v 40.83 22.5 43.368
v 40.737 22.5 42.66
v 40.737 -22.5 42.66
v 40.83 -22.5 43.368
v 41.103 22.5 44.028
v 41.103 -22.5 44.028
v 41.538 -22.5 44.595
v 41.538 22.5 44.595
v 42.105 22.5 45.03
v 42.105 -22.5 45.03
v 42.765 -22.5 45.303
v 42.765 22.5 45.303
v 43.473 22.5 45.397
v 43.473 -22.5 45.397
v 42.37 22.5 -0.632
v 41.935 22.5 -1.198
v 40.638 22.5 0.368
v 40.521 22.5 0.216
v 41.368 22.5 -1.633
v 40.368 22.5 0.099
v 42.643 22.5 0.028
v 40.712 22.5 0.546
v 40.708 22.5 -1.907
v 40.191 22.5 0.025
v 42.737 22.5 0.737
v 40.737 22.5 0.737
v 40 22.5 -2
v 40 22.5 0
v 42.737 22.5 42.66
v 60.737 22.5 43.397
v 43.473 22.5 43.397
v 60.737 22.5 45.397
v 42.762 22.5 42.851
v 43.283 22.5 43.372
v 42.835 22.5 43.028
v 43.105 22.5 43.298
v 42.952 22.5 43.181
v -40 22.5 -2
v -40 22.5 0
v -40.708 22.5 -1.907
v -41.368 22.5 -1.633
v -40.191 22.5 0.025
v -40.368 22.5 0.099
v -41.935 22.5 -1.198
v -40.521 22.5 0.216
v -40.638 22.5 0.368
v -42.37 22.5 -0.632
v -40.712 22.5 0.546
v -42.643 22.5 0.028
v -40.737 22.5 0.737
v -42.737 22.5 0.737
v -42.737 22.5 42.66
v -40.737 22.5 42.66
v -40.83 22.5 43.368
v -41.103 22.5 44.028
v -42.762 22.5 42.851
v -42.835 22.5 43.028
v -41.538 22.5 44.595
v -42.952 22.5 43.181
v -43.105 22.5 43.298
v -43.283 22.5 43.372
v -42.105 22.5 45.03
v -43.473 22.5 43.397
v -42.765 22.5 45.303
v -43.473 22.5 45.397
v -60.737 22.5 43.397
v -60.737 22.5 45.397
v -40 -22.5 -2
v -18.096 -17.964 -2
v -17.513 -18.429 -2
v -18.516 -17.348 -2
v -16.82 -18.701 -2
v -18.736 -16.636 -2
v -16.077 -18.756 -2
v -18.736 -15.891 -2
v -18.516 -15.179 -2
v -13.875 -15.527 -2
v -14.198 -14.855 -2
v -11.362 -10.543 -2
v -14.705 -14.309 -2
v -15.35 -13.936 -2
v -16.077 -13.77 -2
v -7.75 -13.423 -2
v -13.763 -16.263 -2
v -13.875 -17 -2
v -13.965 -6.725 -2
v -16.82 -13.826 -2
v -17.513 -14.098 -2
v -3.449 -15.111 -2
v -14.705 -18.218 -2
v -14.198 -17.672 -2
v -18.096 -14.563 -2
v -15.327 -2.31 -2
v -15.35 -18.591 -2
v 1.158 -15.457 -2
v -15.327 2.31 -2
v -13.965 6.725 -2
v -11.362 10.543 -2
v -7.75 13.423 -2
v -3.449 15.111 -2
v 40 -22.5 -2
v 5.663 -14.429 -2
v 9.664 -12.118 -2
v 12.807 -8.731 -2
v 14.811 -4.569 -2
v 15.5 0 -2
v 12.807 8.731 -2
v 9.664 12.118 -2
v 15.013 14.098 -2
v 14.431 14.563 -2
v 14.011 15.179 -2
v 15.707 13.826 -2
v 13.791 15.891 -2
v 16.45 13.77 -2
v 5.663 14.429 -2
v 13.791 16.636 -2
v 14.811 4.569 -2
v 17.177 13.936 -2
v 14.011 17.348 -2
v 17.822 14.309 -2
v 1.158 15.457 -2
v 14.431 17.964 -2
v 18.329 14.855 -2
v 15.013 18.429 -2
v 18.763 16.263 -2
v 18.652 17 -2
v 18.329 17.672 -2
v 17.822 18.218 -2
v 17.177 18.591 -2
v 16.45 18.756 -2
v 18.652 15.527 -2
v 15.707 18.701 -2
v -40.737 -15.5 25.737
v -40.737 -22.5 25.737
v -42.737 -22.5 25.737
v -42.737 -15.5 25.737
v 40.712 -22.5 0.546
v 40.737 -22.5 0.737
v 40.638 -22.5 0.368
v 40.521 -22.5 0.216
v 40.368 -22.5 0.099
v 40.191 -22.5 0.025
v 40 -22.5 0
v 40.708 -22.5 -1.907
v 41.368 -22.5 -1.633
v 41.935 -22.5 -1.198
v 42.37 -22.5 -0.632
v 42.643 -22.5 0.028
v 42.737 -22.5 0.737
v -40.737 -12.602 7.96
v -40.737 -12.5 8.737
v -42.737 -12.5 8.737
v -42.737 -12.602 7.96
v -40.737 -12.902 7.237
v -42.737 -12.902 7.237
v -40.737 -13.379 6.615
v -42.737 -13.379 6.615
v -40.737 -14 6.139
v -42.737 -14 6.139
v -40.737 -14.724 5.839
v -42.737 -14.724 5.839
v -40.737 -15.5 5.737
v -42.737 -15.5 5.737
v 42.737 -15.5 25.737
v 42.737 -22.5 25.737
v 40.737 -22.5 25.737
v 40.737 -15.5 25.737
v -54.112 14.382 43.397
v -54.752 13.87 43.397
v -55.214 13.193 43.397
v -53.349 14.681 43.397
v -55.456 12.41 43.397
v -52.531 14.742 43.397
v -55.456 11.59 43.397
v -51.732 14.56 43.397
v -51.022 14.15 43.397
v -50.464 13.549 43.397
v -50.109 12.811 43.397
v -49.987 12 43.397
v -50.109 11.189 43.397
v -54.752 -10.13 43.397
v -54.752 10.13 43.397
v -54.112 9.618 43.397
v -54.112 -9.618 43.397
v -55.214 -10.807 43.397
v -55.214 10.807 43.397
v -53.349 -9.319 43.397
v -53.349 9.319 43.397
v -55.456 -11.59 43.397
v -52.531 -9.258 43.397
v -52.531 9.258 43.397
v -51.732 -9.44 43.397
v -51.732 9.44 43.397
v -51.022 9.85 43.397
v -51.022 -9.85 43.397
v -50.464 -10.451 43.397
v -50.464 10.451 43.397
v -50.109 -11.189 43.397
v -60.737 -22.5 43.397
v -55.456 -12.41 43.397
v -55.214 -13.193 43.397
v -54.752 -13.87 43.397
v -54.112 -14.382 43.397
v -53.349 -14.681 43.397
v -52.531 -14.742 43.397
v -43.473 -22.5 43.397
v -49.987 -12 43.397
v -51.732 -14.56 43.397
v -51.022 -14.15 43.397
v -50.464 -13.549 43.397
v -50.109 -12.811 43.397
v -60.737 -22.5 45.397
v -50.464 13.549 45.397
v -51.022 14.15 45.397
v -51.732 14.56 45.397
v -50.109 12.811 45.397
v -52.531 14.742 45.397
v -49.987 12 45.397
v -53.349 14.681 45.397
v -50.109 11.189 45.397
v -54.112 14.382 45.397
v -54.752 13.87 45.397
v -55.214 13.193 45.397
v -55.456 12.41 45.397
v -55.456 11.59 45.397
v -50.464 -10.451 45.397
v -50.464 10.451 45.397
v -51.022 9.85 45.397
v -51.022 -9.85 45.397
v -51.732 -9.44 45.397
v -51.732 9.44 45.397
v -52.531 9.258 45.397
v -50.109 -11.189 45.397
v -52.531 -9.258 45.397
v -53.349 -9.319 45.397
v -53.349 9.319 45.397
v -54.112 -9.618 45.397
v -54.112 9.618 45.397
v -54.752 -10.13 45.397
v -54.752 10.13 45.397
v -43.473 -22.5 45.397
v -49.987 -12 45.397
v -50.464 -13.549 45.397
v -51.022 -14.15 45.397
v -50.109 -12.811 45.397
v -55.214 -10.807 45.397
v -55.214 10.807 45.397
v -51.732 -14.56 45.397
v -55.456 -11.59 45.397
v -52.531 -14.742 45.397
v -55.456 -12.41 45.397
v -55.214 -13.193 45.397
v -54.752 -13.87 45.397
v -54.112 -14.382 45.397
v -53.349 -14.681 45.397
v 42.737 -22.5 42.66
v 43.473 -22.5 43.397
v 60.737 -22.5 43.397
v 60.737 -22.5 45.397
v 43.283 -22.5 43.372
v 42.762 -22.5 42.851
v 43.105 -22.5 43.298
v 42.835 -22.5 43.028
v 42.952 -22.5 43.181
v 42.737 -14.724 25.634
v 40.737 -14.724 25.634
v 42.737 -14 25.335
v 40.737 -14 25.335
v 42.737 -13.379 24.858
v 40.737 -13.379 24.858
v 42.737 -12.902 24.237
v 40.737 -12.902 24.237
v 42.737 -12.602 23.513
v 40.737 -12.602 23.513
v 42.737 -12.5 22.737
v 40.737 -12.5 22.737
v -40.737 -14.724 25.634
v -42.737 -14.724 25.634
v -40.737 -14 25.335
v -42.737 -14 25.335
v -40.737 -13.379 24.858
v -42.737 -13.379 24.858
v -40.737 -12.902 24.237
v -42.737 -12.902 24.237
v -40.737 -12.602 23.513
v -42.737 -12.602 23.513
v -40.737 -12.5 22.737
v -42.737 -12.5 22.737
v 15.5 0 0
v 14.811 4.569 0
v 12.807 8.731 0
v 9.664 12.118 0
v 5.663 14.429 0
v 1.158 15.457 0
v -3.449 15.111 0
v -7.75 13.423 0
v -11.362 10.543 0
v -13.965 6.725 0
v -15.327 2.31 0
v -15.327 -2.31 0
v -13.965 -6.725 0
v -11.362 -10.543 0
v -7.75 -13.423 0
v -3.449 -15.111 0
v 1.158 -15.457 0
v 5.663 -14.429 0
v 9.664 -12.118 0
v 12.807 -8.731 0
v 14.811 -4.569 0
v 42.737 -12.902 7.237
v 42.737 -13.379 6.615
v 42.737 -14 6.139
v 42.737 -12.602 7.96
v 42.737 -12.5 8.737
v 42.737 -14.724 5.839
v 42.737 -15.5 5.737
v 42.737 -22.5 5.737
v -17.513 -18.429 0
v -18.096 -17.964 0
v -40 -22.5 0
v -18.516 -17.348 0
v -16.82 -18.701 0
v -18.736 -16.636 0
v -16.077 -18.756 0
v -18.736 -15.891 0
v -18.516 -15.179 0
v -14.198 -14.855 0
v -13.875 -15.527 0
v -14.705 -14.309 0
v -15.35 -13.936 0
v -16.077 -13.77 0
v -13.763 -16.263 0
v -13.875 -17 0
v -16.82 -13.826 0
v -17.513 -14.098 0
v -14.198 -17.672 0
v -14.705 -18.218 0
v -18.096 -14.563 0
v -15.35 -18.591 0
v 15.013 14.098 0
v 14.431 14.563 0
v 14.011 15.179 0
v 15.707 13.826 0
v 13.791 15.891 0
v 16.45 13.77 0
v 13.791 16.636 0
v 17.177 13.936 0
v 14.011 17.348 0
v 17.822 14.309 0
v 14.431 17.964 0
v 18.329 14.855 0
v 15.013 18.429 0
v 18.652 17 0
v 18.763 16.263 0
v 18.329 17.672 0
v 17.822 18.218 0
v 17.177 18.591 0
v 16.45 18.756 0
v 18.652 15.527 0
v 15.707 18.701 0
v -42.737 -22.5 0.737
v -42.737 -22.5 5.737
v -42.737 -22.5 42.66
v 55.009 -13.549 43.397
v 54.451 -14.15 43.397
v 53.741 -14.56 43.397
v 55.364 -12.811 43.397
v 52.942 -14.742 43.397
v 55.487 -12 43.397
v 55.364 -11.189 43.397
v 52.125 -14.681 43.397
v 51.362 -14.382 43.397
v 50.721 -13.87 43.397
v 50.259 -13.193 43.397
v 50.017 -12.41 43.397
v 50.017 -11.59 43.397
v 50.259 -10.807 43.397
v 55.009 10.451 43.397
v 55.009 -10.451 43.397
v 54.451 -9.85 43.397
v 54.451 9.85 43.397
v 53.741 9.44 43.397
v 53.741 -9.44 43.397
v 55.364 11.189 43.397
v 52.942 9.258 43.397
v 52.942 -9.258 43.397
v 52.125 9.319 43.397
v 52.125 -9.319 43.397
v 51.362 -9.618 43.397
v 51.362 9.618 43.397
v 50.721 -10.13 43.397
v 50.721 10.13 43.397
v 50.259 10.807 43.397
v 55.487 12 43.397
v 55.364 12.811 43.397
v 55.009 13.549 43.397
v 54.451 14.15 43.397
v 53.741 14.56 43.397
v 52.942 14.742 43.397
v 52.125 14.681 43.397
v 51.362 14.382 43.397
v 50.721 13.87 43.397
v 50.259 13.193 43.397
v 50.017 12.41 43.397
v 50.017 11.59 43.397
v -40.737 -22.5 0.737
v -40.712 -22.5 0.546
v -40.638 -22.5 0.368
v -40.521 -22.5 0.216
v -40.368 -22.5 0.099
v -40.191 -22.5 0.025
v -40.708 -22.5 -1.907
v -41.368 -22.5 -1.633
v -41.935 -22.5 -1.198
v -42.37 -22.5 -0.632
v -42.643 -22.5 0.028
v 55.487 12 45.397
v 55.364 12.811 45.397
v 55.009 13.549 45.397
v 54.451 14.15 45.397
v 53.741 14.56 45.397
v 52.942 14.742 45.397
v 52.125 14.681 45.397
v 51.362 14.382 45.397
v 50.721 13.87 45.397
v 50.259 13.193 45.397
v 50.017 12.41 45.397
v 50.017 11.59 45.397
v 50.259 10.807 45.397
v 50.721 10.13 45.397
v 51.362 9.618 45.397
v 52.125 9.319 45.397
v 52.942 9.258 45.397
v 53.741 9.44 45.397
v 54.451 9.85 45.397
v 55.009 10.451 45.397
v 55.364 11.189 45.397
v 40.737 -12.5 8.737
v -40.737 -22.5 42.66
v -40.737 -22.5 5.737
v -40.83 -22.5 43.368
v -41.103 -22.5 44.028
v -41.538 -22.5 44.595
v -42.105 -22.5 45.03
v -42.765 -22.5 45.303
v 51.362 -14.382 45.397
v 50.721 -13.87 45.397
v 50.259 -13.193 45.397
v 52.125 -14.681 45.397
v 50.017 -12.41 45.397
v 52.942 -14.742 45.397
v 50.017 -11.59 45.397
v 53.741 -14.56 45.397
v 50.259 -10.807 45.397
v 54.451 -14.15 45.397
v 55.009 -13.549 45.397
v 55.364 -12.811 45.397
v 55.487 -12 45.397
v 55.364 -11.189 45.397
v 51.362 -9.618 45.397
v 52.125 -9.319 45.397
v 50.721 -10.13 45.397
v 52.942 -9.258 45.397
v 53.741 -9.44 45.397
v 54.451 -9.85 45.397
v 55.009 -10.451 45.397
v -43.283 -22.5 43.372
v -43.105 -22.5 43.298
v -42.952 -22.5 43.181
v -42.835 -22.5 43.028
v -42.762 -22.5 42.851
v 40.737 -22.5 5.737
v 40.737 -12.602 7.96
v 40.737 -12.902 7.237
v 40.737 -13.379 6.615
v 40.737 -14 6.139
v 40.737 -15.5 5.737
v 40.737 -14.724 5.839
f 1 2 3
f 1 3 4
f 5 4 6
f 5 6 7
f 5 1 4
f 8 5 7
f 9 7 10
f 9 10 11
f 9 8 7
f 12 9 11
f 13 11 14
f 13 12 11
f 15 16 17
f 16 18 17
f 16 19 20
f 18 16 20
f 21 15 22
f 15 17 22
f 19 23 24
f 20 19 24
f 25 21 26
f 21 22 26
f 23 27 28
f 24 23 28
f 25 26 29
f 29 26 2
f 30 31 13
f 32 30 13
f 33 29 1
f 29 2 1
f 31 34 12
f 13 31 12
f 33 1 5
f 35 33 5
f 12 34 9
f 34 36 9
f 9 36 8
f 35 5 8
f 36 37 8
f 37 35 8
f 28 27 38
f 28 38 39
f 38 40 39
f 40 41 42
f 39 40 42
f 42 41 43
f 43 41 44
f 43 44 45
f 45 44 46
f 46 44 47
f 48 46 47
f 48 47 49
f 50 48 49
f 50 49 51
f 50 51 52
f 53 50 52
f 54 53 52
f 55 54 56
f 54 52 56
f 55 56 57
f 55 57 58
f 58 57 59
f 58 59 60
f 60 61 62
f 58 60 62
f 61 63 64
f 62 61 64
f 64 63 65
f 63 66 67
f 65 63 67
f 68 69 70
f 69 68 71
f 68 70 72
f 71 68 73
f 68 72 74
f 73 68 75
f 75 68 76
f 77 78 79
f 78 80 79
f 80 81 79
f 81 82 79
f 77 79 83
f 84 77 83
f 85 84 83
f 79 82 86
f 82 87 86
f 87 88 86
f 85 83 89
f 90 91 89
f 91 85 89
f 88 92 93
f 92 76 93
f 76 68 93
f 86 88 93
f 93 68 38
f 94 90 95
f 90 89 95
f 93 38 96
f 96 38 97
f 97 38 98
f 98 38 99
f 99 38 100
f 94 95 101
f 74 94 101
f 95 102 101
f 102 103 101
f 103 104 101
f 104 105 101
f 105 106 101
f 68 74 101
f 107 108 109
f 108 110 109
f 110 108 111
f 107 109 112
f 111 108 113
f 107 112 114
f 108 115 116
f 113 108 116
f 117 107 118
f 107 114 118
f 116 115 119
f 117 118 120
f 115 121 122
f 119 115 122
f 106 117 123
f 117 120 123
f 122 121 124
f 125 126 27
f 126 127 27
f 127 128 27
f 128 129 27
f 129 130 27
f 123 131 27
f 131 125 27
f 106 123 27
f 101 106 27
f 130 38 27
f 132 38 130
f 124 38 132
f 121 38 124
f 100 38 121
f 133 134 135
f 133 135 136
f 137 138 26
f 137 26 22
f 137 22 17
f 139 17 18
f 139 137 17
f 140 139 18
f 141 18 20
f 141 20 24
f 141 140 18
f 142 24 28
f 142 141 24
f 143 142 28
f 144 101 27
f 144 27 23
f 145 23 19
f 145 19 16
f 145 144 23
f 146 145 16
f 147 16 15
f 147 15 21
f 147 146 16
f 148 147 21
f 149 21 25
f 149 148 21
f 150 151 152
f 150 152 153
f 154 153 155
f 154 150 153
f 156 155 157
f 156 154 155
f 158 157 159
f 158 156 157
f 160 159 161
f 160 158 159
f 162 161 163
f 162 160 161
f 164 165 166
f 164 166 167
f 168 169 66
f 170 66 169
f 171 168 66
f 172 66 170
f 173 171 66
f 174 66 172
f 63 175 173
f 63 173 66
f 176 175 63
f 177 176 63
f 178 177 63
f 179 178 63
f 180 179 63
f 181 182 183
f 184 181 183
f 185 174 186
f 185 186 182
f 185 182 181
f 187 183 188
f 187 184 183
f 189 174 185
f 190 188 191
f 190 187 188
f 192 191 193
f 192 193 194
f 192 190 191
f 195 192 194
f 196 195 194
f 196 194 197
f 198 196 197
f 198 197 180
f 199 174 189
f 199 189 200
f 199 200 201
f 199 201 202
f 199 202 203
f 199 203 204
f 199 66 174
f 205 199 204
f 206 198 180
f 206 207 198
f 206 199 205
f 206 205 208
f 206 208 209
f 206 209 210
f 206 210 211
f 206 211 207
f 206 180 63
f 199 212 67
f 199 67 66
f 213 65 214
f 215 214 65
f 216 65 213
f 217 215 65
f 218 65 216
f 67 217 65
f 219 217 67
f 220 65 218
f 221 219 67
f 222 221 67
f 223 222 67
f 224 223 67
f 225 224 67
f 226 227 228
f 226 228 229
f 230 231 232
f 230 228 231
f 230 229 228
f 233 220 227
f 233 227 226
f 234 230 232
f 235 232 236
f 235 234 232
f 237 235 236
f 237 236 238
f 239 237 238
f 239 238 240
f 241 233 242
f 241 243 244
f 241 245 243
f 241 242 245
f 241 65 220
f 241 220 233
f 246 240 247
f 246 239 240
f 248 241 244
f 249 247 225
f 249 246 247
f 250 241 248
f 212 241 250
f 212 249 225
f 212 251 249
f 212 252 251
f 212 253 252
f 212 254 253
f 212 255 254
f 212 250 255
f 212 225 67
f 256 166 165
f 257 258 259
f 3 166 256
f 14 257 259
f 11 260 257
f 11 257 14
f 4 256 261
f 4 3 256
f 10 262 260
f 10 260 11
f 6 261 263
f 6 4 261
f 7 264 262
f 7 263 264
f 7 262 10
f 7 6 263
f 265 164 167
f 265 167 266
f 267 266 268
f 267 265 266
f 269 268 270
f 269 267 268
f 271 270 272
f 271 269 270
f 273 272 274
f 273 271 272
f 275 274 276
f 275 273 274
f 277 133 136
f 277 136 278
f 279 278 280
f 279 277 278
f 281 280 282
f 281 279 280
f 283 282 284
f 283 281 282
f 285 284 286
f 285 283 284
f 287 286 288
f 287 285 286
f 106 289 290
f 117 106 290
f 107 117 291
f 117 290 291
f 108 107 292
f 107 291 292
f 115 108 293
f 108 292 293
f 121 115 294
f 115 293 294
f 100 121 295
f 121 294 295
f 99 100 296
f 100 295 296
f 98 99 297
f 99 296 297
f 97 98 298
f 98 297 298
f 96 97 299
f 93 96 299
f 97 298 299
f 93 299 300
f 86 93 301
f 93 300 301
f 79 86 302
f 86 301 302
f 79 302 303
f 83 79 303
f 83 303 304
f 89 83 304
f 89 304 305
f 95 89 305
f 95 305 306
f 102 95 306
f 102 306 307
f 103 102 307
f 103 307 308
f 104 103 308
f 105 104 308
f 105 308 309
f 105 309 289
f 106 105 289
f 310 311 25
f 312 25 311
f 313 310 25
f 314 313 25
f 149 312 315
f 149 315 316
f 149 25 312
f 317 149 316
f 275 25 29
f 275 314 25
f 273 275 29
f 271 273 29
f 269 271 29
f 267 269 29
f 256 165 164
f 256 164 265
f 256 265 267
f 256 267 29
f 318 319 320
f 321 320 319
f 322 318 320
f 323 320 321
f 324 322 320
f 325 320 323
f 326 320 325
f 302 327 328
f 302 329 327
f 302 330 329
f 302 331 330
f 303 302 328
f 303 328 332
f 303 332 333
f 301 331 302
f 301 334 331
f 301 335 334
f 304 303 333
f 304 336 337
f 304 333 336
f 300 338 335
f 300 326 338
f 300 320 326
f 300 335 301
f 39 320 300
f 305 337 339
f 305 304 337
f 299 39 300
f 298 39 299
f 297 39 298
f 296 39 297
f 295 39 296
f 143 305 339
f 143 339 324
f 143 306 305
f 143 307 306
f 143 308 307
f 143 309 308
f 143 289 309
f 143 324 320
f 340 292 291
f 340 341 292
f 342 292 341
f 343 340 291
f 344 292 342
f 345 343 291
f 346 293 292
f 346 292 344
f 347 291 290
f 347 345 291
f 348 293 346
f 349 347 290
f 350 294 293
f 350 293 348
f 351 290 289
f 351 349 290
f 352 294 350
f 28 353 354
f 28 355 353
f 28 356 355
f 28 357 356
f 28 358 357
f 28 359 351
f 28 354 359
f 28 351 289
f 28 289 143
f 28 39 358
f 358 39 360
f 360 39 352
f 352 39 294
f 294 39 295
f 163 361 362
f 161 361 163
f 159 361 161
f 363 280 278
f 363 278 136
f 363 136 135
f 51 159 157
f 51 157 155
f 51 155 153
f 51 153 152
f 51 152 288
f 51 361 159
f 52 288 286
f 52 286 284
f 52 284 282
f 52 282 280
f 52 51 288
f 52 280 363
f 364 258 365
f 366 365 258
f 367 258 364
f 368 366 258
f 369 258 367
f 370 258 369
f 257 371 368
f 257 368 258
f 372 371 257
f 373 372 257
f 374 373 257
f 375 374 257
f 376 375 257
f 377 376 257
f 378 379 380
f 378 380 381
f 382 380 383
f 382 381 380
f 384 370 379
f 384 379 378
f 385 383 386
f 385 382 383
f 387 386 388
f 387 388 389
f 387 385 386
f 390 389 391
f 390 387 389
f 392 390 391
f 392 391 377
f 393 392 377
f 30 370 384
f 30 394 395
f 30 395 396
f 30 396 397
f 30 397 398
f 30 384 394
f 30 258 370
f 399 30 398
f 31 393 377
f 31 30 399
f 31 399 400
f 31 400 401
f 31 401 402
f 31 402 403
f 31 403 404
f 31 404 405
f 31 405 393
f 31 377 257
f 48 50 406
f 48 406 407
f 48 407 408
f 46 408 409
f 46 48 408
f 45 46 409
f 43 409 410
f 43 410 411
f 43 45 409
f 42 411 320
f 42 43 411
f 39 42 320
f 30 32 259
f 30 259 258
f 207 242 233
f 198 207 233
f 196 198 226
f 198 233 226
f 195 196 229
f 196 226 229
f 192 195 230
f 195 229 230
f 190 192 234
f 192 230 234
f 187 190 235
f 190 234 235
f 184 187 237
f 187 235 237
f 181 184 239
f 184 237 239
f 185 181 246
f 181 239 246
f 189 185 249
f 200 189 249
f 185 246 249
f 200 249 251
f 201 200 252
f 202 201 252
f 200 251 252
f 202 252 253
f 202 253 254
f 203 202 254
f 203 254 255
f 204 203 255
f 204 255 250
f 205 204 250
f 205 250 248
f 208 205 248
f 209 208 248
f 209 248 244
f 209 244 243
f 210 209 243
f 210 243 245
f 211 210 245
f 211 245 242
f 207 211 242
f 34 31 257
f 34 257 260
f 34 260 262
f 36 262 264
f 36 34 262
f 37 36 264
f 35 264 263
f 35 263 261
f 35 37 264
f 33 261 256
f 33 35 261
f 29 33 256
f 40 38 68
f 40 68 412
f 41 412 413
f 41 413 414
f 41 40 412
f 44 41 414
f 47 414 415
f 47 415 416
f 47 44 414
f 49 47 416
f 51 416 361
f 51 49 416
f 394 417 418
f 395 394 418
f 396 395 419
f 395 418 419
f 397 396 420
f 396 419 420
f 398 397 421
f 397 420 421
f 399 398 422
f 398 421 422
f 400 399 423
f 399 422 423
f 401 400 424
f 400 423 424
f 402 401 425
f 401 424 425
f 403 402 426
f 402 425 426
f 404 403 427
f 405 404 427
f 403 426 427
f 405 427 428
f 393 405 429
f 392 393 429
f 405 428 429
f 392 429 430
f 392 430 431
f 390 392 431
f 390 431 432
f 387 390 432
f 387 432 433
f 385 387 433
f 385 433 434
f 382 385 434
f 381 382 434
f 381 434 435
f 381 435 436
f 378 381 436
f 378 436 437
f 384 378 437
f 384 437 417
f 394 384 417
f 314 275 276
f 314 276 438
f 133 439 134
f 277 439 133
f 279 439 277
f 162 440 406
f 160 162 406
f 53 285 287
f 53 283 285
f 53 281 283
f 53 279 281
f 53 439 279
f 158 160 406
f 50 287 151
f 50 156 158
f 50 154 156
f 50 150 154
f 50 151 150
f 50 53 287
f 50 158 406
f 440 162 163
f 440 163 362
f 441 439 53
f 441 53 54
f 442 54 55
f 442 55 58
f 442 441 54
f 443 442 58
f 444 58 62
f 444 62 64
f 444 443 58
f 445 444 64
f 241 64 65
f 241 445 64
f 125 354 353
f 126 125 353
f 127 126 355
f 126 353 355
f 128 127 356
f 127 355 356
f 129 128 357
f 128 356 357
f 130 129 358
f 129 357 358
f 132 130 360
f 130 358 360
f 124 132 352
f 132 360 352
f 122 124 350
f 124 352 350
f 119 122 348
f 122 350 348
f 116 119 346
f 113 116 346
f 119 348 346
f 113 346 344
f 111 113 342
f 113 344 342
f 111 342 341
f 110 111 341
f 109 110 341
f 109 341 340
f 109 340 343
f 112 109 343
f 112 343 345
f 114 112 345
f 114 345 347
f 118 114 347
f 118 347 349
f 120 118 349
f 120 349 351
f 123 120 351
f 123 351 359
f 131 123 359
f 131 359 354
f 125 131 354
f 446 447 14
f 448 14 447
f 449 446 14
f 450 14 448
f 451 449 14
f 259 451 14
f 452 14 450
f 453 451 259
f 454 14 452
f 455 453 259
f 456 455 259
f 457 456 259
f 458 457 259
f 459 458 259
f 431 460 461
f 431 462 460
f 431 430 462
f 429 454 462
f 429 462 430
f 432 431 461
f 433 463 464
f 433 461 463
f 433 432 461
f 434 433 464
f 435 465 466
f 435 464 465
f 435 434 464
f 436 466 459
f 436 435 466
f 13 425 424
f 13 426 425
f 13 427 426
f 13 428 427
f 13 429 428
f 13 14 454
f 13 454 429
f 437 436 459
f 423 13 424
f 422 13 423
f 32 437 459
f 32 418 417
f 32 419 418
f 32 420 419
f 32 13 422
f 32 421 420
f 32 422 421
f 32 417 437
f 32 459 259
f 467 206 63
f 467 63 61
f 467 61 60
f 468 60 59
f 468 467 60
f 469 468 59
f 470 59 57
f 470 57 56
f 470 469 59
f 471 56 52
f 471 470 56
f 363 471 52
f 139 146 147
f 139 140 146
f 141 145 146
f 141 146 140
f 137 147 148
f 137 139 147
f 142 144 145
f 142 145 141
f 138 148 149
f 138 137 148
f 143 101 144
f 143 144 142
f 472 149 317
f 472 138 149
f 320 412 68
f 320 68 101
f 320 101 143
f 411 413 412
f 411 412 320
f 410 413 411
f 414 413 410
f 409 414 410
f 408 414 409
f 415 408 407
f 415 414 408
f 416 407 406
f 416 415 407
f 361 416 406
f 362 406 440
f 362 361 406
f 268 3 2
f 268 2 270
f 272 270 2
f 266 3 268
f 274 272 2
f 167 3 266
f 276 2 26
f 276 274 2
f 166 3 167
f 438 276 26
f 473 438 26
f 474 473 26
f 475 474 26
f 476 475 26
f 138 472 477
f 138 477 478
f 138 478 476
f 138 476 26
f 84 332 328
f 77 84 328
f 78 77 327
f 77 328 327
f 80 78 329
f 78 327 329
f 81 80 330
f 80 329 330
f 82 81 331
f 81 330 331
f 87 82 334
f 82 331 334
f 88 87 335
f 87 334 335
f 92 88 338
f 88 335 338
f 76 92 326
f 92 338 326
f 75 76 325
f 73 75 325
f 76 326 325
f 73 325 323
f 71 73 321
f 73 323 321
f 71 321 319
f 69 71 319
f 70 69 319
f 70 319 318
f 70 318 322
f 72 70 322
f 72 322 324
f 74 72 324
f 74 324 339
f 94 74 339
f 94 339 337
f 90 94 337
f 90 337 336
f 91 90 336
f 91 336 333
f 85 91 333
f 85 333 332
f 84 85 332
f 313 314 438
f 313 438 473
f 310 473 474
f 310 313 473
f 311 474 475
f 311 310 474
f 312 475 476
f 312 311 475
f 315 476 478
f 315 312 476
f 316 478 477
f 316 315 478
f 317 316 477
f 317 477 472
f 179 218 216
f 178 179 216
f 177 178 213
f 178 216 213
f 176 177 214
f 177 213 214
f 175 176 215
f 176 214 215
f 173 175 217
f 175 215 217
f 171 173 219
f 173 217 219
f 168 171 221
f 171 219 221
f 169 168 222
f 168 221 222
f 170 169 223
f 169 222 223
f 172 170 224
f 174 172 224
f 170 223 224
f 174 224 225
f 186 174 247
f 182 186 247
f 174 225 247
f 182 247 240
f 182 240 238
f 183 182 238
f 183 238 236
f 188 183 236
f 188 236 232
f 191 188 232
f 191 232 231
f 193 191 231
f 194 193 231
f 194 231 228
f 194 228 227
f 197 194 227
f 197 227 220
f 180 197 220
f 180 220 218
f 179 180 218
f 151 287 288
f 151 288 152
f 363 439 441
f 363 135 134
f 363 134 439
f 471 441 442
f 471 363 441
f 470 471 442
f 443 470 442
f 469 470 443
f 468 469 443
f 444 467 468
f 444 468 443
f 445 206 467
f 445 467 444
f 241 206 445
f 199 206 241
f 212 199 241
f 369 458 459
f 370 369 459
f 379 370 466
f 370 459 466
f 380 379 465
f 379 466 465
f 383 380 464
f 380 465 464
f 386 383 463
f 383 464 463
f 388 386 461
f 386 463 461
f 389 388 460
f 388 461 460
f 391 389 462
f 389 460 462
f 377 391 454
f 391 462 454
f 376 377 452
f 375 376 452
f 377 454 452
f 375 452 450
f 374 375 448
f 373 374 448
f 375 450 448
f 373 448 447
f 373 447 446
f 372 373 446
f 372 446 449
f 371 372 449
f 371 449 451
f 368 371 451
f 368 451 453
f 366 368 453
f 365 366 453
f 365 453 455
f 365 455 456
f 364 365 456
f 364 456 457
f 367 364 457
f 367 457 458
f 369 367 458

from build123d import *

# Parameters (mm, degrees)
SKETCH2_W               = 80
SKETCH2_H               = 45
BASE_FLANGE1_DEPTH      = 2
EDGE_FLANGE1_DEPTH      = 45
EDGE_FLANGE2_DEPTH      = 45
SKETCH13_R              = 15.5
CUT_EXTRUDE1_DEPTH      = 65.440224857
SKETCH14_R              = 2.5
CUT_EXTRUDE2_DEPTH      = 65.440224857
EDGE_FLANGE3_DEPTH      = 45
EDGE_FLANGE3_BEND_DEPTH = 45
SKETCH21_R              = 2.75
CUT_EXTRUDE3_DEPTH      = 81.259717612
CUT_EXTRUDE4_DEPTH      = 116.211997682


# Sheet-metal steps are written as plain solids
with BuildPart() as part:
    # Sketch2 → Base-Flange1 (new body)
    with BuildSketch(Plane.XY):
        Rectangle(SKETCH2_W, SKETCH2_H)
    extrude(amount=-BASE_FLANGE1_DEPTH)

    # Edge-Flange1 section (across the edge) → Edge-Flange1 (add)
    with BuildSketch(Plane(origin=(40.7366, -22.5, 0), x_dir=(-1, 0, 0), z_dir=(0, 1, 0))):
        with BuildLine():
            Line((-2, 0.7366), (-2, 42.66))
            Line((-2, 42.66), (0, 42.66))
            Line((0, 42.66), (0, 0.7366))
            ThreePointArc((0, 0.7366), (0.215745145, 0.215745145), (0.7366, 0))
            Line((0.7366, 0), (0.7366, -2))
            ThreePointArc((0.7366, -2), (-1.198468417, -1.198468417), (-2, 0.7366))
        make_face()
    extrude(amount=EDGE_FLANGE1_DEPTH)

    # Edge-Flange2 section (across the edge) → Edge-Flange2 (add)
    with BuildSketch(Plane(origin=(-40.7366, 22.5, 0), x_dir=(1, 0, 0), z_dir=(0, -1, 0))):
        with BuildLine():
            Line((-2, 0.7366), (-2, 42.66))
            Line((-2, 42.66), (0, 42.66))
            Line((0, 42.66), (0, 0.7366))
            ThreePointArc((0, 0.7366), (0.215745145, 0.215745145), (0.7366, 0))
            Line((0.7366, 0), (0.7366, -2))
            ThreePointArc((0.7366, -2), (-1.198468417, -1.198468417), (-2, 0.7366))
        make_face()
    extrude(amount=EDGE_FLANGE2_DEPTH)

    # Sketch13 → Cut-Extrude1 (cut, through all)
    with BuildSketch(Plane.XY):
        Circle(SKETCH13_R)
    extrude(amount=-CUT_EXTRUDE1_DEPTH, mode=Mode.SUBTRACT)

    # Sketch14 → Cut-Extrude2 (cut, through all)
    with BuildSketch(Plane.XY):
        with Locations((-16.263455967, -16.263455967)):
            Circle(SKETCH14_R)
        with Locations((16.263455967, 16.263455967)):
            Circle(SKETCH14_R)
    extrude(amount=-CUT_EXTRUDE2_DEPTH, mode=Mode.SUBTRACT)

    # Edge-Flange3 section (across the edge) → Edge-Flange3 (add)
    with BuildSketch(Plane(origin=(42.7366, 22.5, 43.3966), x_dir=(0, 0, -1), z_dir=(0, -1, 0))):
        with BuildLine():
            Line((-2, 0.7366), (-2, 18))
            Line((-2, 18), (0, 18))
            Line((0, 18), (0, 0.7366))
            ThreePointArc((0, 0.7366), (0.215745145, 0.215745145), (0.7366, 0))
            Line((0.7366, 0), (0.7366, -2))
            ThreePointArc((0.7366, -2), (-1.198468417, -1.198468417), (-2, 0.7366))
        make_face()
    extrude(amount=EDGE_FLANGE3_DEPTH)

    # Edge-Flange3 section 2 (across the edge) → Edge-Flange3 bend (add)
    with BuildSketch(Plane(origin=(-42.7366, -22.5, 43.3966), x_dir=(0, 0, -1), z_dir=(0, 1, 0))):
        with BuildLine():
            Line((-2, 0.7366), (-2, 18))
            Line((-2, 18), (0, 18))
            Line((0, 18), (0, 0.7366))
            ThreePointArc((0, 0.7366), (0.215745145, 0.215745145), (0.7366, 0))
            Line((0.7366, 0), (0.7366, -2))
            ThreePointArc((0.7366, -2), (-1.198468417, -1.198468417), (-2, 0.7366))
        make_face()
    extrude(amount=EDGE_FLANGE3_BEND_DEPTH)

    # Sketch21 → Cut-Extrude3 (cut, through all)
    with BuildSketch(Plane.XY.offset(45.3966)):
        with Locations((52.7366, 12)):
            Circle(SKETCH21_R)
        with Locations((52.7366, -12)):
            Circle(SKETCH21_R)
        with Locations((-52.7366, 12)):
            Circle(SKETCH21_R)
        with Locations((-52.7366, -12)):
            Circle(SKETCH21_R)
    extrude(amount=-CUT_EXTRUDE3_DEPTH, mode=Mode.SUBTRACT)

    # Sketch22 → Cut-Extrude4 (cut, through all)
    with BuildSketch(Plane(origin=(42.7366, 0, 0), x_dir=(0, 0, -1), z_dir=(1, 0, 0))):
        with BuildLine():
            Line((-5.7366, -22.5), (-25.7366, -22.5))
            Line((-25.7366, -22.5), (-25.7366, -15.5))
            ThreePointArc((-25.7366, -15.5), (-24.857920344, -13.378679656), (-22.7366, -12.5))
            Line((-22.7366, -12.5), (-8.7366, -12.5))
            ThreePointArc((-8.7366, -12.5), (-6.615279656, -13.378679656), (-5.7366, -15.5))
            Line((-5.7366, -15.5), (-5.7366, -22.5))
        make_face()
    extrude(amount=-CUT_EXTRUDE4_DEPTH, mode=Mode.SUBTRACT)


solid = part.part
